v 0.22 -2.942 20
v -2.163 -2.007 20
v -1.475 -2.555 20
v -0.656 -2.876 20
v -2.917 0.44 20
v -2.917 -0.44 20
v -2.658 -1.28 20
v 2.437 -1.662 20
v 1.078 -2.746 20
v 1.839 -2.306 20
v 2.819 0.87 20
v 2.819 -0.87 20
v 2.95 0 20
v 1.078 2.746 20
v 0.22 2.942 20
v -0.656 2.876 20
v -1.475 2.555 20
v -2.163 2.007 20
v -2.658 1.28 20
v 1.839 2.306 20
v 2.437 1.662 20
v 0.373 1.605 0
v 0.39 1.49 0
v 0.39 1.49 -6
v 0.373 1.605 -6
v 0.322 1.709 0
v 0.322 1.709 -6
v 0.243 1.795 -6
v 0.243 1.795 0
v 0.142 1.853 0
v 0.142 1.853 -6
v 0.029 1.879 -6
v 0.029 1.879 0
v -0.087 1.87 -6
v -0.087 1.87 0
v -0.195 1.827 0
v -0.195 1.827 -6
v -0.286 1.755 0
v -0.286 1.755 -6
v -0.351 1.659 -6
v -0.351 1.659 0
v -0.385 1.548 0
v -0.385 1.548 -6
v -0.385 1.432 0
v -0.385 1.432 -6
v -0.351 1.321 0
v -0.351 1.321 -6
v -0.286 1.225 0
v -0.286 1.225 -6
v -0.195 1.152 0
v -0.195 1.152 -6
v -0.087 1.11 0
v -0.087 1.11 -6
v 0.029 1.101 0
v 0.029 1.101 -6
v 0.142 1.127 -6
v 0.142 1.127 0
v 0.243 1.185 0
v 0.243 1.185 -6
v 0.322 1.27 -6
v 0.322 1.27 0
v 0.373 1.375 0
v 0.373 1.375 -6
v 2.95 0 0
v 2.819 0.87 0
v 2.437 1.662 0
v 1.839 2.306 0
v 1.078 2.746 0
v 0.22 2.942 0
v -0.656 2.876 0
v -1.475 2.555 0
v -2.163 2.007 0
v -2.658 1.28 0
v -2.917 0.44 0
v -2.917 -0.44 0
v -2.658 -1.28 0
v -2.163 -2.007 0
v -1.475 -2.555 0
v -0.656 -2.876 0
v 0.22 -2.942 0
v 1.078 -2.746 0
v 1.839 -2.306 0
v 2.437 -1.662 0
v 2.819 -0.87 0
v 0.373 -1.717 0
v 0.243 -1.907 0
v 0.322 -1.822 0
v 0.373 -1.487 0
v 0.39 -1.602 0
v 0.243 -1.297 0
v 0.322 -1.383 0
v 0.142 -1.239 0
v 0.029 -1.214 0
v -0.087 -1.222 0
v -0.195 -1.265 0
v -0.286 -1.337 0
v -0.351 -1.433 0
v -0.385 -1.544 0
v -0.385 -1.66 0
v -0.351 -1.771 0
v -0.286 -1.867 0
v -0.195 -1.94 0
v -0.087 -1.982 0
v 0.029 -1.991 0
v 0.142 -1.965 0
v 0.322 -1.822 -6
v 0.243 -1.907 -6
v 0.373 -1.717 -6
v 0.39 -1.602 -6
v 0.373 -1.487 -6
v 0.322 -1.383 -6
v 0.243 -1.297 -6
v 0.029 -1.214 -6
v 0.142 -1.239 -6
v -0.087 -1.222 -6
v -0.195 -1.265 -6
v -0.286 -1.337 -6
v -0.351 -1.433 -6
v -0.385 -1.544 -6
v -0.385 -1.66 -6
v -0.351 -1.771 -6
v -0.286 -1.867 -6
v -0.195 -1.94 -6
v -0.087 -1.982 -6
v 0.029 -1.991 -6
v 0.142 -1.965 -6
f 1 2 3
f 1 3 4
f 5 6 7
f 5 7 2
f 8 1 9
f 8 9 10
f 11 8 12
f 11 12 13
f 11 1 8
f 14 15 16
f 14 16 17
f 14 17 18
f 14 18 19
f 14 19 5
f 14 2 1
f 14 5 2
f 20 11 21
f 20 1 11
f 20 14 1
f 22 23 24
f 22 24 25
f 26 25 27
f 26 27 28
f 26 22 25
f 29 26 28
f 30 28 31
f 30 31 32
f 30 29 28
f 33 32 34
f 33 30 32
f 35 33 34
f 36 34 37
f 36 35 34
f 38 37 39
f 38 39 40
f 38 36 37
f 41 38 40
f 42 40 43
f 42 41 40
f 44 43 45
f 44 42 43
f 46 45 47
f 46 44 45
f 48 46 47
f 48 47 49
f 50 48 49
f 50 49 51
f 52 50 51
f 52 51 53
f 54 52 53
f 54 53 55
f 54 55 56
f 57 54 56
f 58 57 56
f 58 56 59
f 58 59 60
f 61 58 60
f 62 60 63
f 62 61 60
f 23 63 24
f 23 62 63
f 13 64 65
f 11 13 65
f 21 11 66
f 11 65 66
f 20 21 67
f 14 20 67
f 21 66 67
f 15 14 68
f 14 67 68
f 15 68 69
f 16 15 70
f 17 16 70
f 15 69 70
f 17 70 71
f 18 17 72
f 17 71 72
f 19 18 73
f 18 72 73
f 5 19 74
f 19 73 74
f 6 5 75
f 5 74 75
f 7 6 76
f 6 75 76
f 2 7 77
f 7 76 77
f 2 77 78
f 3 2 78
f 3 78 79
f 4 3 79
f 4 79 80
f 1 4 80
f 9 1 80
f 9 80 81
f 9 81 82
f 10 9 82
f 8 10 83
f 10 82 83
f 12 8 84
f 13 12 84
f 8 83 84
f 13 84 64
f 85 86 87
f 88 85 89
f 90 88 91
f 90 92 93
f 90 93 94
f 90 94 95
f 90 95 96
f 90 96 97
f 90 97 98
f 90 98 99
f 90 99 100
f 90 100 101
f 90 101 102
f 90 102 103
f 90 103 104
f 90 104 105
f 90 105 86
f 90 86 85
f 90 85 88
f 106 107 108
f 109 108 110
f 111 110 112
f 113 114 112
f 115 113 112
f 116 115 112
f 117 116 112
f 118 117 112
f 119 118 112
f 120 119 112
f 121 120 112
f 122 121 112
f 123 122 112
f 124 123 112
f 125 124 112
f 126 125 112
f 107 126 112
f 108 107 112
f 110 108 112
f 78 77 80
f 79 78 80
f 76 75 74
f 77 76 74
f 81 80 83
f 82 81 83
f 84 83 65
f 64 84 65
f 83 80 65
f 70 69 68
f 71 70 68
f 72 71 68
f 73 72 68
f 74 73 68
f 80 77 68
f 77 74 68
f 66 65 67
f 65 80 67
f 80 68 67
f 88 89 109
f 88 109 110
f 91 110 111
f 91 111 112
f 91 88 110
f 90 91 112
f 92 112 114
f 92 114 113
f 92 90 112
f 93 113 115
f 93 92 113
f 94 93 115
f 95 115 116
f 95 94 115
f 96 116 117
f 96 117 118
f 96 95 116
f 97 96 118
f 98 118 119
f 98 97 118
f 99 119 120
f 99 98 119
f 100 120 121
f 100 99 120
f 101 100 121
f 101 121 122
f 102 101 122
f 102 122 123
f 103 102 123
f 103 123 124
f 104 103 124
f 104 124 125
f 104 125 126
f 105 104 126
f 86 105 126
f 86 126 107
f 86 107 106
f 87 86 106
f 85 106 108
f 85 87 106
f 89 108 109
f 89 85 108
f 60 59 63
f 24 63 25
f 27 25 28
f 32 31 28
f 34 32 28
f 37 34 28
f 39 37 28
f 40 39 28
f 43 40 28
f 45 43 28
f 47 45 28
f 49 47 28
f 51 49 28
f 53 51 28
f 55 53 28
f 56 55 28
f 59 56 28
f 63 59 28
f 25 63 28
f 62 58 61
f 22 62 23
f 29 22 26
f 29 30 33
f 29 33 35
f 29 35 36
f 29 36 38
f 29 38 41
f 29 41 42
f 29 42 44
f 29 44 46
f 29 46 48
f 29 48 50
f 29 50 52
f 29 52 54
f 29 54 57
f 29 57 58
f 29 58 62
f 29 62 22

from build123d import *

# Parameters (mm, degrees)
CROQUIS5_R                = 0.389818599
SALIENTE_EXTRUIR3_DEPTH   = 6
SALIENTE_EXTRUIR3_2_DEPTH = 6
CROQUIS4_R                = 2.95
SALIENTE_EXTRUIR4_DEPTH   = 20


with BuildPart() as part:
    # Croquis5 → Saliente-Extruir3 (new body)
    with BuildSketch(Plane.XY):
        with Locations((0, 1.489822979)):
            Circle(CROQUIS5_R)
    extrude(amount=-SALIENTE_EXTRUIR3_DEPTH)


with BuildPart() as body_2:
    # Croquis5 → Saliente-Extruir3 2 (new body)
    with BuildSketch(Plane.XY):
        with Locations((0, -1.60226245)):
            Circle(CROQUIS5_R)
    extrude(amount=-SALIENTE_EXTRUIR3_2_DEPTH)


with BuildPart() as body_3:
    # Croquis4 → Saliente-Extruir4 (new body)
    with BuildSketch(Plane.XY):
        Circle(CROQUIS4_R)
    extrude(amount=SALIENTE_EXTRUIR4_DEPTH)


solid = Compound([part.part, body_2.part, body_3.part])
